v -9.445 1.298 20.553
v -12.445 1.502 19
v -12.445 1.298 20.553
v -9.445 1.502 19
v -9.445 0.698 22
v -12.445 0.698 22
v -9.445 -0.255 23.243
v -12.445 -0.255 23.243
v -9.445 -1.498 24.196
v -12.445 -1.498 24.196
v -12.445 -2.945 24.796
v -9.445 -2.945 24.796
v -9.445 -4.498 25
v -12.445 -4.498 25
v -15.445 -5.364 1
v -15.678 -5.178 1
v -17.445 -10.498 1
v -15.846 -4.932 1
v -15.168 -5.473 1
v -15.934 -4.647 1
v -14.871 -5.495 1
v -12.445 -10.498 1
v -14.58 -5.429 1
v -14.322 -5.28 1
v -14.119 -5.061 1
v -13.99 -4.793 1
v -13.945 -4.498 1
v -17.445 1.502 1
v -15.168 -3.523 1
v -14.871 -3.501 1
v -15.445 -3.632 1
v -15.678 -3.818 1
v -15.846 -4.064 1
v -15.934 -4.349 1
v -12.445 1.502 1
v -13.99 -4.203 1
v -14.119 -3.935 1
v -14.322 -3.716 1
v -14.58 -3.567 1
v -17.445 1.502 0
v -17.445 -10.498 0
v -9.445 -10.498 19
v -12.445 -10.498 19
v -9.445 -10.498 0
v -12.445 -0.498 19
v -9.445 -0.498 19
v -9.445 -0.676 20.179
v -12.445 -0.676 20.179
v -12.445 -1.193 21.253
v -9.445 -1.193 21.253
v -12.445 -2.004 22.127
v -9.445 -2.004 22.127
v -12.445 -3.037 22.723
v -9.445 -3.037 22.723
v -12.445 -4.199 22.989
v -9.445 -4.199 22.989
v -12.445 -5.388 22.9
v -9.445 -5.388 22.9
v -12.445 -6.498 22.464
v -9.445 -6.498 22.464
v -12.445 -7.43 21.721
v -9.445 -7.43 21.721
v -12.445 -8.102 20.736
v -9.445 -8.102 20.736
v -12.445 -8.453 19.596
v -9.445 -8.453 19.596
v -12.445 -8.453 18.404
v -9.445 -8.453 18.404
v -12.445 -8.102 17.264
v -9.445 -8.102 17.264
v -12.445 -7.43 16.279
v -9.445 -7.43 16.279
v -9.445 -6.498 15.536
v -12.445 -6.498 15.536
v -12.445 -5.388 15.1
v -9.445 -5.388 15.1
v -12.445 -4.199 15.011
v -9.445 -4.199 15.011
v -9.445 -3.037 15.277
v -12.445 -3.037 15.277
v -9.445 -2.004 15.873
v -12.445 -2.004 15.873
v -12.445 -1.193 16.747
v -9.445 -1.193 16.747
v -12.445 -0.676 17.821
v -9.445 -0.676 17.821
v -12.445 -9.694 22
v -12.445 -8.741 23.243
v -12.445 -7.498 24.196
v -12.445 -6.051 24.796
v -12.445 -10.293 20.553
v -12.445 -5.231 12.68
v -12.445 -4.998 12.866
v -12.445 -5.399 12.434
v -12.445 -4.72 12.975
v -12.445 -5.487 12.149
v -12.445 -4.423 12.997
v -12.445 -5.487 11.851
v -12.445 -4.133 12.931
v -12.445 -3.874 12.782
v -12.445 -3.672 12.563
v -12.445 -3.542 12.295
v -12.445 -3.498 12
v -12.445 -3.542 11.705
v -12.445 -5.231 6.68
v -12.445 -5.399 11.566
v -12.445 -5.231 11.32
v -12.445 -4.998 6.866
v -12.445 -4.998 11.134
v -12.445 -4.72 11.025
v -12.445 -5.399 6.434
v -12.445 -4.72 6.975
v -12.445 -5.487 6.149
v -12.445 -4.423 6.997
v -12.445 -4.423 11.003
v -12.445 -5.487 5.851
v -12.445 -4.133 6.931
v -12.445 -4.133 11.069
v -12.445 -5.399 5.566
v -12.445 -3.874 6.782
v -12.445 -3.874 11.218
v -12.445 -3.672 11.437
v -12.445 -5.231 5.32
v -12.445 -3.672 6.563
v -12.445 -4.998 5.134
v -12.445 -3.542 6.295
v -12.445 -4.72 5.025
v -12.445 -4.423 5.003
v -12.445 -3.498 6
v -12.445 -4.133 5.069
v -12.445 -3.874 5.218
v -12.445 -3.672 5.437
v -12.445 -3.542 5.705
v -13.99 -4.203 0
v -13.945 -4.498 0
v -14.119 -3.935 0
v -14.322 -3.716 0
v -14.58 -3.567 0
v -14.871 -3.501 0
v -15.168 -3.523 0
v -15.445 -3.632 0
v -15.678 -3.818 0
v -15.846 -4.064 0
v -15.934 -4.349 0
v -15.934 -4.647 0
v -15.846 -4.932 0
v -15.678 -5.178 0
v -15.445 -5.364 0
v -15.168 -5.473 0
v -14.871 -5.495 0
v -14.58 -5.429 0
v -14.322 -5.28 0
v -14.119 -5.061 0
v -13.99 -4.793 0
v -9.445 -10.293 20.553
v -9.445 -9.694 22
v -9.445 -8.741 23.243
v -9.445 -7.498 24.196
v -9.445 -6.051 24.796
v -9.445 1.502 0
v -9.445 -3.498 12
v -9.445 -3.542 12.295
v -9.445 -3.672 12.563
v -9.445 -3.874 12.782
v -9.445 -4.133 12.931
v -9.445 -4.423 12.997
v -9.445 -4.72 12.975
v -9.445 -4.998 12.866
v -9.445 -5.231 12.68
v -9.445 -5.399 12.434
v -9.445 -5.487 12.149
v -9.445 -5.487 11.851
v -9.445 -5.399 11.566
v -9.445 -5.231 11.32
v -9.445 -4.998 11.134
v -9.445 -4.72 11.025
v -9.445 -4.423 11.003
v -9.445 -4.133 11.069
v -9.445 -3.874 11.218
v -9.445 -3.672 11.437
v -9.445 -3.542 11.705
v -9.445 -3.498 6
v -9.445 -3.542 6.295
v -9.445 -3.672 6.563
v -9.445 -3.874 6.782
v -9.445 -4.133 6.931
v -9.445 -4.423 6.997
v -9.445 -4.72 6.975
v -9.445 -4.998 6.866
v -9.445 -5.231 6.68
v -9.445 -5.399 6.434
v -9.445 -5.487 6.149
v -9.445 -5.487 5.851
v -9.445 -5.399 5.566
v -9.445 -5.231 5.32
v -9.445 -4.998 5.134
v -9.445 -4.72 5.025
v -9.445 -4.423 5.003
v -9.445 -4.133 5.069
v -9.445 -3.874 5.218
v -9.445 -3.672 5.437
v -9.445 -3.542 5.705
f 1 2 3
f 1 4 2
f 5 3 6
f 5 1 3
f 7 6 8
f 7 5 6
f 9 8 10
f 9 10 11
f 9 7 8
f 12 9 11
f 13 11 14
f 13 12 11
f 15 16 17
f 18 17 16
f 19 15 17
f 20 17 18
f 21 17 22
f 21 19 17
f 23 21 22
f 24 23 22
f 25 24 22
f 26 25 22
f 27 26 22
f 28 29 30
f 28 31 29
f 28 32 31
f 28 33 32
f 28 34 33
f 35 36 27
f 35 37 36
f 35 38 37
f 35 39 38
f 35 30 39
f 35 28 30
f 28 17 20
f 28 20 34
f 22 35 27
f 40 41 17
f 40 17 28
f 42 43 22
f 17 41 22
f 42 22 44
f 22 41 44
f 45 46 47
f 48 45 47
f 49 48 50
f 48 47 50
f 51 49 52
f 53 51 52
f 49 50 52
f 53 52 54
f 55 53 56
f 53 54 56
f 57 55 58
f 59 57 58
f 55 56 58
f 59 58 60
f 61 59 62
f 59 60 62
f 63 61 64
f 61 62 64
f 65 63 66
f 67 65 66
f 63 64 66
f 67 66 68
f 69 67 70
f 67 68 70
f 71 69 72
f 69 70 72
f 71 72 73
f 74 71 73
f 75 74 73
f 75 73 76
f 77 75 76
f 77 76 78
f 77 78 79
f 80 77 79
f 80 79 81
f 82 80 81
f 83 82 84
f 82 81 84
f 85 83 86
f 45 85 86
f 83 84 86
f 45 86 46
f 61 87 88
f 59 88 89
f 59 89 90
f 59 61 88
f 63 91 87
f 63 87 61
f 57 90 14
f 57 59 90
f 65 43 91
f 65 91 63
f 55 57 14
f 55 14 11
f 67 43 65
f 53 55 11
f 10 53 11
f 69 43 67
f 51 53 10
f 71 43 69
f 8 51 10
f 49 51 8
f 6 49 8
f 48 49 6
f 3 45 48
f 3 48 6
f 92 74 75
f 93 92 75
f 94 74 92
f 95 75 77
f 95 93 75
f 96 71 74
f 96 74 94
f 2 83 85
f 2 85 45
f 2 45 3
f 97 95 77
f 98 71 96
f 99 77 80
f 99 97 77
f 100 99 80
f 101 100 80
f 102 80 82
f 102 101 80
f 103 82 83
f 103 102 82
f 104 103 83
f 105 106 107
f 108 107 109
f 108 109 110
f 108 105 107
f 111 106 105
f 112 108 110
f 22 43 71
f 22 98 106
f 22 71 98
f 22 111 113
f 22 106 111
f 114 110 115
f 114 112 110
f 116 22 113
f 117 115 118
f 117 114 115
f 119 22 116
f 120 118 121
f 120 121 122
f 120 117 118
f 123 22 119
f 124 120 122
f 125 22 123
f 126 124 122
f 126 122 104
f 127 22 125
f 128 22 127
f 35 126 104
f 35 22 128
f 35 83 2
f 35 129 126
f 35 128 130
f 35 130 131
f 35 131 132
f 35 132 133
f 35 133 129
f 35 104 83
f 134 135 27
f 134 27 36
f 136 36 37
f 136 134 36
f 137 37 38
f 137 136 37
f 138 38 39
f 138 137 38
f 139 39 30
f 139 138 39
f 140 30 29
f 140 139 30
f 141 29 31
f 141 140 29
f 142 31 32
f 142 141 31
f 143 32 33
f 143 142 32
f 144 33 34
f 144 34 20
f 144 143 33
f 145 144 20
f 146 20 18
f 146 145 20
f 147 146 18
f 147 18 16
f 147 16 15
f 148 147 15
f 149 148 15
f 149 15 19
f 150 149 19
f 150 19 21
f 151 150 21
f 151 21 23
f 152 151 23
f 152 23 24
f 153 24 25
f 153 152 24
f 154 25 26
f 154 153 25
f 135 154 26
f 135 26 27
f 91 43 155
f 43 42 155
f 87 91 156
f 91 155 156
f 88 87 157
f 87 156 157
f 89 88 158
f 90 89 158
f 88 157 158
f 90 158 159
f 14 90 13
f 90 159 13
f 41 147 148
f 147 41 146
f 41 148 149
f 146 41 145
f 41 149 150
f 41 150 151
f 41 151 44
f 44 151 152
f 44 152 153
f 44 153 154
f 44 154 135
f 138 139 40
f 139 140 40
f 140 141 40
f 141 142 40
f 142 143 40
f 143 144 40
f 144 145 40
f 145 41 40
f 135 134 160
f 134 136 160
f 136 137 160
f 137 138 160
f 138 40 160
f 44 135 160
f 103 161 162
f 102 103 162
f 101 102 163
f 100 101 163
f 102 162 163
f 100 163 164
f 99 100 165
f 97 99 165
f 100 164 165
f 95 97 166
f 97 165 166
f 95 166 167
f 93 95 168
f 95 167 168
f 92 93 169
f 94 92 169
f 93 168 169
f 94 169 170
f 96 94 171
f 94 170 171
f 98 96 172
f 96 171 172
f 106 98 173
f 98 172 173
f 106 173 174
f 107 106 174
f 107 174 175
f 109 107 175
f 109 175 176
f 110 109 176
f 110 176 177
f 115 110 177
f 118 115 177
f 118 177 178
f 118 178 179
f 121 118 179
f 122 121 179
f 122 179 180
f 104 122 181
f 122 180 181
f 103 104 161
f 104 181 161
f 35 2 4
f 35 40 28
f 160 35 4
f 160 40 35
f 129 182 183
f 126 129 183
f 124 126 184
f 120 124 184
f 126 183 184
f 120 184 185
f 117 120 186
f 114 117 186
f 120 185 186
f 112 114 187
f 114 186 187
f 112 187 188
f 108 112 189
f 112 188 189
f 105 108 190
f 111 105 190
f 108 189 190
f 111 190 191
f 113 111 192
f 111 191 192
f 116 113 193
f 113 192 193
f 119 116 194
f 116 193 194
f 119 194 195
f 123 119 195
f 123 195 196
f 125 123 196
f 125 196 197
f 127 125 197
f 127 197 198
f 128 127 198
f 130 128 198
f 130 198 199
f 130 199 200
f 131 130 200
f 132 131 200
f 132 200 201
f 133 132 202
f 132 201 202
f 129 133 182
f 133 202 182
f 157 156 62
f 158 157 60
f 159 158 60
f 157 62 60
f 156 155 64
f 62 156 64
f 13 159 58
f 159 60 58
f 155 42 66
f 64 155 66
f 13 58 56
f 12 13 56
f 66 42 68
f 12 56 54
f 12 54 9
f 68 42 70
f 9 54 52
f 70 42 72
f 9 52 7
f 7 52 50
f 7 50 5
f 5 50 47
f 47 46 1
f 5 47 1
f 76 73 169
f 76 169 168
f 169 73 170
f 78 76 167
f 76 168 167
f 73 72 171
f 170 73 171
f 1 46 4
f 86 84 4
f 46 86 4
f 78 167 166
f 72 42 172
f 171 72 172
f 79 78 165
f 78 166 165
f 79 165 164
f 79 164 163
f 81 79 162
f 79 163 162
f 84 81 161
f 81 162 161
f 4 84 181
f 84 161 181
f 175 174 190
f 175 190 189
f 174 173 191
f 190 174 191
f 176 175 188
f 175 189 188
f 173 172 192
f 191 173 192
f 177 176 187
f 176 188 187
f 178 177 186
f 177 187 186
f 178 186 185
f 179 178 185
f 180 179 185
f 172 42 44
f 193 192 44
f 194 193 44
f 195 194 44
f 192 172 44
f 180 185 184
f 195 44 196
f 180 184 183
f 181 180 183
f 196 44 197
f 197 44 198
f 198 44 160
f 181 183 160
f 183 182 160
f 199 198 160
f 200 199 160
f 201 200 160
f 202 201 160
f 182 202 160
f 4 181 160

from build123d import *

# Parameters (mm, degrees)
F0_W     = 5
F0_H     = 12
F0_R     = 1
F1_DEPTH = 1
F0_W_2   = 3
F2_DEPTH = 25
F3_R     = 4
F3_R_2   = 1
F4_DEPTH = 3
F5_R     = 5.99999


# Not quite as in the source:
# - a fillet or chamfer is up to 0.001 mm smaller than in the source, because OpenCascade refuses the exact size


with BuildPart() as f1:
    # F0 (on Top) → F1 (new body)
    with BuildSketch(Plane.XY):
        with Locations((-14.9452780058, -4.4979301263)):
            Rectangle(F0_W, F0_H)
        with Locations((-14.9452780058, -4.4979301263)):
            Circle(F0_R, mode=Mode.SUBTRACT)
    extrude(amount=F1_DEPTH)

    # F0 (on Top) → F2 (join)
    with BuildSketch(Plane.XY):
        with Locations((-10.9452780058, -4.4979301263)):
            Rectangle(F0_W_2, F0_H)
    extrude(amount=F2_DEPTH)

    # F3 (on face) → F4 (cut)
    with BuildSketch(Plane.YZ.offset(-9.4452780058)):
        with Locations((-4.4979301263, 19)):
            Circle(F3_R)
        with Locations((-4.4979301263, 12)):
            Circle(F3_R_2)
        with Locations((-4.4979301263, 6)):
            Circle(F3_R_2)
    extrude(amount=-F4_DEPTH, mode=Mode.SUBTRACT)

    # F5 (radius 6 in the source; OpenCascade refuses exactly that, so slightly less here)
    f5_edges = [f1.edges().sort_by_distance(p)[0] for p in [
        (-10.945278, 1.50207, 25),
        (-10.945278, -10.49793, 25),
    ]]
    fillet(f5_edges, radius=F5_R)


solid = f1.part
